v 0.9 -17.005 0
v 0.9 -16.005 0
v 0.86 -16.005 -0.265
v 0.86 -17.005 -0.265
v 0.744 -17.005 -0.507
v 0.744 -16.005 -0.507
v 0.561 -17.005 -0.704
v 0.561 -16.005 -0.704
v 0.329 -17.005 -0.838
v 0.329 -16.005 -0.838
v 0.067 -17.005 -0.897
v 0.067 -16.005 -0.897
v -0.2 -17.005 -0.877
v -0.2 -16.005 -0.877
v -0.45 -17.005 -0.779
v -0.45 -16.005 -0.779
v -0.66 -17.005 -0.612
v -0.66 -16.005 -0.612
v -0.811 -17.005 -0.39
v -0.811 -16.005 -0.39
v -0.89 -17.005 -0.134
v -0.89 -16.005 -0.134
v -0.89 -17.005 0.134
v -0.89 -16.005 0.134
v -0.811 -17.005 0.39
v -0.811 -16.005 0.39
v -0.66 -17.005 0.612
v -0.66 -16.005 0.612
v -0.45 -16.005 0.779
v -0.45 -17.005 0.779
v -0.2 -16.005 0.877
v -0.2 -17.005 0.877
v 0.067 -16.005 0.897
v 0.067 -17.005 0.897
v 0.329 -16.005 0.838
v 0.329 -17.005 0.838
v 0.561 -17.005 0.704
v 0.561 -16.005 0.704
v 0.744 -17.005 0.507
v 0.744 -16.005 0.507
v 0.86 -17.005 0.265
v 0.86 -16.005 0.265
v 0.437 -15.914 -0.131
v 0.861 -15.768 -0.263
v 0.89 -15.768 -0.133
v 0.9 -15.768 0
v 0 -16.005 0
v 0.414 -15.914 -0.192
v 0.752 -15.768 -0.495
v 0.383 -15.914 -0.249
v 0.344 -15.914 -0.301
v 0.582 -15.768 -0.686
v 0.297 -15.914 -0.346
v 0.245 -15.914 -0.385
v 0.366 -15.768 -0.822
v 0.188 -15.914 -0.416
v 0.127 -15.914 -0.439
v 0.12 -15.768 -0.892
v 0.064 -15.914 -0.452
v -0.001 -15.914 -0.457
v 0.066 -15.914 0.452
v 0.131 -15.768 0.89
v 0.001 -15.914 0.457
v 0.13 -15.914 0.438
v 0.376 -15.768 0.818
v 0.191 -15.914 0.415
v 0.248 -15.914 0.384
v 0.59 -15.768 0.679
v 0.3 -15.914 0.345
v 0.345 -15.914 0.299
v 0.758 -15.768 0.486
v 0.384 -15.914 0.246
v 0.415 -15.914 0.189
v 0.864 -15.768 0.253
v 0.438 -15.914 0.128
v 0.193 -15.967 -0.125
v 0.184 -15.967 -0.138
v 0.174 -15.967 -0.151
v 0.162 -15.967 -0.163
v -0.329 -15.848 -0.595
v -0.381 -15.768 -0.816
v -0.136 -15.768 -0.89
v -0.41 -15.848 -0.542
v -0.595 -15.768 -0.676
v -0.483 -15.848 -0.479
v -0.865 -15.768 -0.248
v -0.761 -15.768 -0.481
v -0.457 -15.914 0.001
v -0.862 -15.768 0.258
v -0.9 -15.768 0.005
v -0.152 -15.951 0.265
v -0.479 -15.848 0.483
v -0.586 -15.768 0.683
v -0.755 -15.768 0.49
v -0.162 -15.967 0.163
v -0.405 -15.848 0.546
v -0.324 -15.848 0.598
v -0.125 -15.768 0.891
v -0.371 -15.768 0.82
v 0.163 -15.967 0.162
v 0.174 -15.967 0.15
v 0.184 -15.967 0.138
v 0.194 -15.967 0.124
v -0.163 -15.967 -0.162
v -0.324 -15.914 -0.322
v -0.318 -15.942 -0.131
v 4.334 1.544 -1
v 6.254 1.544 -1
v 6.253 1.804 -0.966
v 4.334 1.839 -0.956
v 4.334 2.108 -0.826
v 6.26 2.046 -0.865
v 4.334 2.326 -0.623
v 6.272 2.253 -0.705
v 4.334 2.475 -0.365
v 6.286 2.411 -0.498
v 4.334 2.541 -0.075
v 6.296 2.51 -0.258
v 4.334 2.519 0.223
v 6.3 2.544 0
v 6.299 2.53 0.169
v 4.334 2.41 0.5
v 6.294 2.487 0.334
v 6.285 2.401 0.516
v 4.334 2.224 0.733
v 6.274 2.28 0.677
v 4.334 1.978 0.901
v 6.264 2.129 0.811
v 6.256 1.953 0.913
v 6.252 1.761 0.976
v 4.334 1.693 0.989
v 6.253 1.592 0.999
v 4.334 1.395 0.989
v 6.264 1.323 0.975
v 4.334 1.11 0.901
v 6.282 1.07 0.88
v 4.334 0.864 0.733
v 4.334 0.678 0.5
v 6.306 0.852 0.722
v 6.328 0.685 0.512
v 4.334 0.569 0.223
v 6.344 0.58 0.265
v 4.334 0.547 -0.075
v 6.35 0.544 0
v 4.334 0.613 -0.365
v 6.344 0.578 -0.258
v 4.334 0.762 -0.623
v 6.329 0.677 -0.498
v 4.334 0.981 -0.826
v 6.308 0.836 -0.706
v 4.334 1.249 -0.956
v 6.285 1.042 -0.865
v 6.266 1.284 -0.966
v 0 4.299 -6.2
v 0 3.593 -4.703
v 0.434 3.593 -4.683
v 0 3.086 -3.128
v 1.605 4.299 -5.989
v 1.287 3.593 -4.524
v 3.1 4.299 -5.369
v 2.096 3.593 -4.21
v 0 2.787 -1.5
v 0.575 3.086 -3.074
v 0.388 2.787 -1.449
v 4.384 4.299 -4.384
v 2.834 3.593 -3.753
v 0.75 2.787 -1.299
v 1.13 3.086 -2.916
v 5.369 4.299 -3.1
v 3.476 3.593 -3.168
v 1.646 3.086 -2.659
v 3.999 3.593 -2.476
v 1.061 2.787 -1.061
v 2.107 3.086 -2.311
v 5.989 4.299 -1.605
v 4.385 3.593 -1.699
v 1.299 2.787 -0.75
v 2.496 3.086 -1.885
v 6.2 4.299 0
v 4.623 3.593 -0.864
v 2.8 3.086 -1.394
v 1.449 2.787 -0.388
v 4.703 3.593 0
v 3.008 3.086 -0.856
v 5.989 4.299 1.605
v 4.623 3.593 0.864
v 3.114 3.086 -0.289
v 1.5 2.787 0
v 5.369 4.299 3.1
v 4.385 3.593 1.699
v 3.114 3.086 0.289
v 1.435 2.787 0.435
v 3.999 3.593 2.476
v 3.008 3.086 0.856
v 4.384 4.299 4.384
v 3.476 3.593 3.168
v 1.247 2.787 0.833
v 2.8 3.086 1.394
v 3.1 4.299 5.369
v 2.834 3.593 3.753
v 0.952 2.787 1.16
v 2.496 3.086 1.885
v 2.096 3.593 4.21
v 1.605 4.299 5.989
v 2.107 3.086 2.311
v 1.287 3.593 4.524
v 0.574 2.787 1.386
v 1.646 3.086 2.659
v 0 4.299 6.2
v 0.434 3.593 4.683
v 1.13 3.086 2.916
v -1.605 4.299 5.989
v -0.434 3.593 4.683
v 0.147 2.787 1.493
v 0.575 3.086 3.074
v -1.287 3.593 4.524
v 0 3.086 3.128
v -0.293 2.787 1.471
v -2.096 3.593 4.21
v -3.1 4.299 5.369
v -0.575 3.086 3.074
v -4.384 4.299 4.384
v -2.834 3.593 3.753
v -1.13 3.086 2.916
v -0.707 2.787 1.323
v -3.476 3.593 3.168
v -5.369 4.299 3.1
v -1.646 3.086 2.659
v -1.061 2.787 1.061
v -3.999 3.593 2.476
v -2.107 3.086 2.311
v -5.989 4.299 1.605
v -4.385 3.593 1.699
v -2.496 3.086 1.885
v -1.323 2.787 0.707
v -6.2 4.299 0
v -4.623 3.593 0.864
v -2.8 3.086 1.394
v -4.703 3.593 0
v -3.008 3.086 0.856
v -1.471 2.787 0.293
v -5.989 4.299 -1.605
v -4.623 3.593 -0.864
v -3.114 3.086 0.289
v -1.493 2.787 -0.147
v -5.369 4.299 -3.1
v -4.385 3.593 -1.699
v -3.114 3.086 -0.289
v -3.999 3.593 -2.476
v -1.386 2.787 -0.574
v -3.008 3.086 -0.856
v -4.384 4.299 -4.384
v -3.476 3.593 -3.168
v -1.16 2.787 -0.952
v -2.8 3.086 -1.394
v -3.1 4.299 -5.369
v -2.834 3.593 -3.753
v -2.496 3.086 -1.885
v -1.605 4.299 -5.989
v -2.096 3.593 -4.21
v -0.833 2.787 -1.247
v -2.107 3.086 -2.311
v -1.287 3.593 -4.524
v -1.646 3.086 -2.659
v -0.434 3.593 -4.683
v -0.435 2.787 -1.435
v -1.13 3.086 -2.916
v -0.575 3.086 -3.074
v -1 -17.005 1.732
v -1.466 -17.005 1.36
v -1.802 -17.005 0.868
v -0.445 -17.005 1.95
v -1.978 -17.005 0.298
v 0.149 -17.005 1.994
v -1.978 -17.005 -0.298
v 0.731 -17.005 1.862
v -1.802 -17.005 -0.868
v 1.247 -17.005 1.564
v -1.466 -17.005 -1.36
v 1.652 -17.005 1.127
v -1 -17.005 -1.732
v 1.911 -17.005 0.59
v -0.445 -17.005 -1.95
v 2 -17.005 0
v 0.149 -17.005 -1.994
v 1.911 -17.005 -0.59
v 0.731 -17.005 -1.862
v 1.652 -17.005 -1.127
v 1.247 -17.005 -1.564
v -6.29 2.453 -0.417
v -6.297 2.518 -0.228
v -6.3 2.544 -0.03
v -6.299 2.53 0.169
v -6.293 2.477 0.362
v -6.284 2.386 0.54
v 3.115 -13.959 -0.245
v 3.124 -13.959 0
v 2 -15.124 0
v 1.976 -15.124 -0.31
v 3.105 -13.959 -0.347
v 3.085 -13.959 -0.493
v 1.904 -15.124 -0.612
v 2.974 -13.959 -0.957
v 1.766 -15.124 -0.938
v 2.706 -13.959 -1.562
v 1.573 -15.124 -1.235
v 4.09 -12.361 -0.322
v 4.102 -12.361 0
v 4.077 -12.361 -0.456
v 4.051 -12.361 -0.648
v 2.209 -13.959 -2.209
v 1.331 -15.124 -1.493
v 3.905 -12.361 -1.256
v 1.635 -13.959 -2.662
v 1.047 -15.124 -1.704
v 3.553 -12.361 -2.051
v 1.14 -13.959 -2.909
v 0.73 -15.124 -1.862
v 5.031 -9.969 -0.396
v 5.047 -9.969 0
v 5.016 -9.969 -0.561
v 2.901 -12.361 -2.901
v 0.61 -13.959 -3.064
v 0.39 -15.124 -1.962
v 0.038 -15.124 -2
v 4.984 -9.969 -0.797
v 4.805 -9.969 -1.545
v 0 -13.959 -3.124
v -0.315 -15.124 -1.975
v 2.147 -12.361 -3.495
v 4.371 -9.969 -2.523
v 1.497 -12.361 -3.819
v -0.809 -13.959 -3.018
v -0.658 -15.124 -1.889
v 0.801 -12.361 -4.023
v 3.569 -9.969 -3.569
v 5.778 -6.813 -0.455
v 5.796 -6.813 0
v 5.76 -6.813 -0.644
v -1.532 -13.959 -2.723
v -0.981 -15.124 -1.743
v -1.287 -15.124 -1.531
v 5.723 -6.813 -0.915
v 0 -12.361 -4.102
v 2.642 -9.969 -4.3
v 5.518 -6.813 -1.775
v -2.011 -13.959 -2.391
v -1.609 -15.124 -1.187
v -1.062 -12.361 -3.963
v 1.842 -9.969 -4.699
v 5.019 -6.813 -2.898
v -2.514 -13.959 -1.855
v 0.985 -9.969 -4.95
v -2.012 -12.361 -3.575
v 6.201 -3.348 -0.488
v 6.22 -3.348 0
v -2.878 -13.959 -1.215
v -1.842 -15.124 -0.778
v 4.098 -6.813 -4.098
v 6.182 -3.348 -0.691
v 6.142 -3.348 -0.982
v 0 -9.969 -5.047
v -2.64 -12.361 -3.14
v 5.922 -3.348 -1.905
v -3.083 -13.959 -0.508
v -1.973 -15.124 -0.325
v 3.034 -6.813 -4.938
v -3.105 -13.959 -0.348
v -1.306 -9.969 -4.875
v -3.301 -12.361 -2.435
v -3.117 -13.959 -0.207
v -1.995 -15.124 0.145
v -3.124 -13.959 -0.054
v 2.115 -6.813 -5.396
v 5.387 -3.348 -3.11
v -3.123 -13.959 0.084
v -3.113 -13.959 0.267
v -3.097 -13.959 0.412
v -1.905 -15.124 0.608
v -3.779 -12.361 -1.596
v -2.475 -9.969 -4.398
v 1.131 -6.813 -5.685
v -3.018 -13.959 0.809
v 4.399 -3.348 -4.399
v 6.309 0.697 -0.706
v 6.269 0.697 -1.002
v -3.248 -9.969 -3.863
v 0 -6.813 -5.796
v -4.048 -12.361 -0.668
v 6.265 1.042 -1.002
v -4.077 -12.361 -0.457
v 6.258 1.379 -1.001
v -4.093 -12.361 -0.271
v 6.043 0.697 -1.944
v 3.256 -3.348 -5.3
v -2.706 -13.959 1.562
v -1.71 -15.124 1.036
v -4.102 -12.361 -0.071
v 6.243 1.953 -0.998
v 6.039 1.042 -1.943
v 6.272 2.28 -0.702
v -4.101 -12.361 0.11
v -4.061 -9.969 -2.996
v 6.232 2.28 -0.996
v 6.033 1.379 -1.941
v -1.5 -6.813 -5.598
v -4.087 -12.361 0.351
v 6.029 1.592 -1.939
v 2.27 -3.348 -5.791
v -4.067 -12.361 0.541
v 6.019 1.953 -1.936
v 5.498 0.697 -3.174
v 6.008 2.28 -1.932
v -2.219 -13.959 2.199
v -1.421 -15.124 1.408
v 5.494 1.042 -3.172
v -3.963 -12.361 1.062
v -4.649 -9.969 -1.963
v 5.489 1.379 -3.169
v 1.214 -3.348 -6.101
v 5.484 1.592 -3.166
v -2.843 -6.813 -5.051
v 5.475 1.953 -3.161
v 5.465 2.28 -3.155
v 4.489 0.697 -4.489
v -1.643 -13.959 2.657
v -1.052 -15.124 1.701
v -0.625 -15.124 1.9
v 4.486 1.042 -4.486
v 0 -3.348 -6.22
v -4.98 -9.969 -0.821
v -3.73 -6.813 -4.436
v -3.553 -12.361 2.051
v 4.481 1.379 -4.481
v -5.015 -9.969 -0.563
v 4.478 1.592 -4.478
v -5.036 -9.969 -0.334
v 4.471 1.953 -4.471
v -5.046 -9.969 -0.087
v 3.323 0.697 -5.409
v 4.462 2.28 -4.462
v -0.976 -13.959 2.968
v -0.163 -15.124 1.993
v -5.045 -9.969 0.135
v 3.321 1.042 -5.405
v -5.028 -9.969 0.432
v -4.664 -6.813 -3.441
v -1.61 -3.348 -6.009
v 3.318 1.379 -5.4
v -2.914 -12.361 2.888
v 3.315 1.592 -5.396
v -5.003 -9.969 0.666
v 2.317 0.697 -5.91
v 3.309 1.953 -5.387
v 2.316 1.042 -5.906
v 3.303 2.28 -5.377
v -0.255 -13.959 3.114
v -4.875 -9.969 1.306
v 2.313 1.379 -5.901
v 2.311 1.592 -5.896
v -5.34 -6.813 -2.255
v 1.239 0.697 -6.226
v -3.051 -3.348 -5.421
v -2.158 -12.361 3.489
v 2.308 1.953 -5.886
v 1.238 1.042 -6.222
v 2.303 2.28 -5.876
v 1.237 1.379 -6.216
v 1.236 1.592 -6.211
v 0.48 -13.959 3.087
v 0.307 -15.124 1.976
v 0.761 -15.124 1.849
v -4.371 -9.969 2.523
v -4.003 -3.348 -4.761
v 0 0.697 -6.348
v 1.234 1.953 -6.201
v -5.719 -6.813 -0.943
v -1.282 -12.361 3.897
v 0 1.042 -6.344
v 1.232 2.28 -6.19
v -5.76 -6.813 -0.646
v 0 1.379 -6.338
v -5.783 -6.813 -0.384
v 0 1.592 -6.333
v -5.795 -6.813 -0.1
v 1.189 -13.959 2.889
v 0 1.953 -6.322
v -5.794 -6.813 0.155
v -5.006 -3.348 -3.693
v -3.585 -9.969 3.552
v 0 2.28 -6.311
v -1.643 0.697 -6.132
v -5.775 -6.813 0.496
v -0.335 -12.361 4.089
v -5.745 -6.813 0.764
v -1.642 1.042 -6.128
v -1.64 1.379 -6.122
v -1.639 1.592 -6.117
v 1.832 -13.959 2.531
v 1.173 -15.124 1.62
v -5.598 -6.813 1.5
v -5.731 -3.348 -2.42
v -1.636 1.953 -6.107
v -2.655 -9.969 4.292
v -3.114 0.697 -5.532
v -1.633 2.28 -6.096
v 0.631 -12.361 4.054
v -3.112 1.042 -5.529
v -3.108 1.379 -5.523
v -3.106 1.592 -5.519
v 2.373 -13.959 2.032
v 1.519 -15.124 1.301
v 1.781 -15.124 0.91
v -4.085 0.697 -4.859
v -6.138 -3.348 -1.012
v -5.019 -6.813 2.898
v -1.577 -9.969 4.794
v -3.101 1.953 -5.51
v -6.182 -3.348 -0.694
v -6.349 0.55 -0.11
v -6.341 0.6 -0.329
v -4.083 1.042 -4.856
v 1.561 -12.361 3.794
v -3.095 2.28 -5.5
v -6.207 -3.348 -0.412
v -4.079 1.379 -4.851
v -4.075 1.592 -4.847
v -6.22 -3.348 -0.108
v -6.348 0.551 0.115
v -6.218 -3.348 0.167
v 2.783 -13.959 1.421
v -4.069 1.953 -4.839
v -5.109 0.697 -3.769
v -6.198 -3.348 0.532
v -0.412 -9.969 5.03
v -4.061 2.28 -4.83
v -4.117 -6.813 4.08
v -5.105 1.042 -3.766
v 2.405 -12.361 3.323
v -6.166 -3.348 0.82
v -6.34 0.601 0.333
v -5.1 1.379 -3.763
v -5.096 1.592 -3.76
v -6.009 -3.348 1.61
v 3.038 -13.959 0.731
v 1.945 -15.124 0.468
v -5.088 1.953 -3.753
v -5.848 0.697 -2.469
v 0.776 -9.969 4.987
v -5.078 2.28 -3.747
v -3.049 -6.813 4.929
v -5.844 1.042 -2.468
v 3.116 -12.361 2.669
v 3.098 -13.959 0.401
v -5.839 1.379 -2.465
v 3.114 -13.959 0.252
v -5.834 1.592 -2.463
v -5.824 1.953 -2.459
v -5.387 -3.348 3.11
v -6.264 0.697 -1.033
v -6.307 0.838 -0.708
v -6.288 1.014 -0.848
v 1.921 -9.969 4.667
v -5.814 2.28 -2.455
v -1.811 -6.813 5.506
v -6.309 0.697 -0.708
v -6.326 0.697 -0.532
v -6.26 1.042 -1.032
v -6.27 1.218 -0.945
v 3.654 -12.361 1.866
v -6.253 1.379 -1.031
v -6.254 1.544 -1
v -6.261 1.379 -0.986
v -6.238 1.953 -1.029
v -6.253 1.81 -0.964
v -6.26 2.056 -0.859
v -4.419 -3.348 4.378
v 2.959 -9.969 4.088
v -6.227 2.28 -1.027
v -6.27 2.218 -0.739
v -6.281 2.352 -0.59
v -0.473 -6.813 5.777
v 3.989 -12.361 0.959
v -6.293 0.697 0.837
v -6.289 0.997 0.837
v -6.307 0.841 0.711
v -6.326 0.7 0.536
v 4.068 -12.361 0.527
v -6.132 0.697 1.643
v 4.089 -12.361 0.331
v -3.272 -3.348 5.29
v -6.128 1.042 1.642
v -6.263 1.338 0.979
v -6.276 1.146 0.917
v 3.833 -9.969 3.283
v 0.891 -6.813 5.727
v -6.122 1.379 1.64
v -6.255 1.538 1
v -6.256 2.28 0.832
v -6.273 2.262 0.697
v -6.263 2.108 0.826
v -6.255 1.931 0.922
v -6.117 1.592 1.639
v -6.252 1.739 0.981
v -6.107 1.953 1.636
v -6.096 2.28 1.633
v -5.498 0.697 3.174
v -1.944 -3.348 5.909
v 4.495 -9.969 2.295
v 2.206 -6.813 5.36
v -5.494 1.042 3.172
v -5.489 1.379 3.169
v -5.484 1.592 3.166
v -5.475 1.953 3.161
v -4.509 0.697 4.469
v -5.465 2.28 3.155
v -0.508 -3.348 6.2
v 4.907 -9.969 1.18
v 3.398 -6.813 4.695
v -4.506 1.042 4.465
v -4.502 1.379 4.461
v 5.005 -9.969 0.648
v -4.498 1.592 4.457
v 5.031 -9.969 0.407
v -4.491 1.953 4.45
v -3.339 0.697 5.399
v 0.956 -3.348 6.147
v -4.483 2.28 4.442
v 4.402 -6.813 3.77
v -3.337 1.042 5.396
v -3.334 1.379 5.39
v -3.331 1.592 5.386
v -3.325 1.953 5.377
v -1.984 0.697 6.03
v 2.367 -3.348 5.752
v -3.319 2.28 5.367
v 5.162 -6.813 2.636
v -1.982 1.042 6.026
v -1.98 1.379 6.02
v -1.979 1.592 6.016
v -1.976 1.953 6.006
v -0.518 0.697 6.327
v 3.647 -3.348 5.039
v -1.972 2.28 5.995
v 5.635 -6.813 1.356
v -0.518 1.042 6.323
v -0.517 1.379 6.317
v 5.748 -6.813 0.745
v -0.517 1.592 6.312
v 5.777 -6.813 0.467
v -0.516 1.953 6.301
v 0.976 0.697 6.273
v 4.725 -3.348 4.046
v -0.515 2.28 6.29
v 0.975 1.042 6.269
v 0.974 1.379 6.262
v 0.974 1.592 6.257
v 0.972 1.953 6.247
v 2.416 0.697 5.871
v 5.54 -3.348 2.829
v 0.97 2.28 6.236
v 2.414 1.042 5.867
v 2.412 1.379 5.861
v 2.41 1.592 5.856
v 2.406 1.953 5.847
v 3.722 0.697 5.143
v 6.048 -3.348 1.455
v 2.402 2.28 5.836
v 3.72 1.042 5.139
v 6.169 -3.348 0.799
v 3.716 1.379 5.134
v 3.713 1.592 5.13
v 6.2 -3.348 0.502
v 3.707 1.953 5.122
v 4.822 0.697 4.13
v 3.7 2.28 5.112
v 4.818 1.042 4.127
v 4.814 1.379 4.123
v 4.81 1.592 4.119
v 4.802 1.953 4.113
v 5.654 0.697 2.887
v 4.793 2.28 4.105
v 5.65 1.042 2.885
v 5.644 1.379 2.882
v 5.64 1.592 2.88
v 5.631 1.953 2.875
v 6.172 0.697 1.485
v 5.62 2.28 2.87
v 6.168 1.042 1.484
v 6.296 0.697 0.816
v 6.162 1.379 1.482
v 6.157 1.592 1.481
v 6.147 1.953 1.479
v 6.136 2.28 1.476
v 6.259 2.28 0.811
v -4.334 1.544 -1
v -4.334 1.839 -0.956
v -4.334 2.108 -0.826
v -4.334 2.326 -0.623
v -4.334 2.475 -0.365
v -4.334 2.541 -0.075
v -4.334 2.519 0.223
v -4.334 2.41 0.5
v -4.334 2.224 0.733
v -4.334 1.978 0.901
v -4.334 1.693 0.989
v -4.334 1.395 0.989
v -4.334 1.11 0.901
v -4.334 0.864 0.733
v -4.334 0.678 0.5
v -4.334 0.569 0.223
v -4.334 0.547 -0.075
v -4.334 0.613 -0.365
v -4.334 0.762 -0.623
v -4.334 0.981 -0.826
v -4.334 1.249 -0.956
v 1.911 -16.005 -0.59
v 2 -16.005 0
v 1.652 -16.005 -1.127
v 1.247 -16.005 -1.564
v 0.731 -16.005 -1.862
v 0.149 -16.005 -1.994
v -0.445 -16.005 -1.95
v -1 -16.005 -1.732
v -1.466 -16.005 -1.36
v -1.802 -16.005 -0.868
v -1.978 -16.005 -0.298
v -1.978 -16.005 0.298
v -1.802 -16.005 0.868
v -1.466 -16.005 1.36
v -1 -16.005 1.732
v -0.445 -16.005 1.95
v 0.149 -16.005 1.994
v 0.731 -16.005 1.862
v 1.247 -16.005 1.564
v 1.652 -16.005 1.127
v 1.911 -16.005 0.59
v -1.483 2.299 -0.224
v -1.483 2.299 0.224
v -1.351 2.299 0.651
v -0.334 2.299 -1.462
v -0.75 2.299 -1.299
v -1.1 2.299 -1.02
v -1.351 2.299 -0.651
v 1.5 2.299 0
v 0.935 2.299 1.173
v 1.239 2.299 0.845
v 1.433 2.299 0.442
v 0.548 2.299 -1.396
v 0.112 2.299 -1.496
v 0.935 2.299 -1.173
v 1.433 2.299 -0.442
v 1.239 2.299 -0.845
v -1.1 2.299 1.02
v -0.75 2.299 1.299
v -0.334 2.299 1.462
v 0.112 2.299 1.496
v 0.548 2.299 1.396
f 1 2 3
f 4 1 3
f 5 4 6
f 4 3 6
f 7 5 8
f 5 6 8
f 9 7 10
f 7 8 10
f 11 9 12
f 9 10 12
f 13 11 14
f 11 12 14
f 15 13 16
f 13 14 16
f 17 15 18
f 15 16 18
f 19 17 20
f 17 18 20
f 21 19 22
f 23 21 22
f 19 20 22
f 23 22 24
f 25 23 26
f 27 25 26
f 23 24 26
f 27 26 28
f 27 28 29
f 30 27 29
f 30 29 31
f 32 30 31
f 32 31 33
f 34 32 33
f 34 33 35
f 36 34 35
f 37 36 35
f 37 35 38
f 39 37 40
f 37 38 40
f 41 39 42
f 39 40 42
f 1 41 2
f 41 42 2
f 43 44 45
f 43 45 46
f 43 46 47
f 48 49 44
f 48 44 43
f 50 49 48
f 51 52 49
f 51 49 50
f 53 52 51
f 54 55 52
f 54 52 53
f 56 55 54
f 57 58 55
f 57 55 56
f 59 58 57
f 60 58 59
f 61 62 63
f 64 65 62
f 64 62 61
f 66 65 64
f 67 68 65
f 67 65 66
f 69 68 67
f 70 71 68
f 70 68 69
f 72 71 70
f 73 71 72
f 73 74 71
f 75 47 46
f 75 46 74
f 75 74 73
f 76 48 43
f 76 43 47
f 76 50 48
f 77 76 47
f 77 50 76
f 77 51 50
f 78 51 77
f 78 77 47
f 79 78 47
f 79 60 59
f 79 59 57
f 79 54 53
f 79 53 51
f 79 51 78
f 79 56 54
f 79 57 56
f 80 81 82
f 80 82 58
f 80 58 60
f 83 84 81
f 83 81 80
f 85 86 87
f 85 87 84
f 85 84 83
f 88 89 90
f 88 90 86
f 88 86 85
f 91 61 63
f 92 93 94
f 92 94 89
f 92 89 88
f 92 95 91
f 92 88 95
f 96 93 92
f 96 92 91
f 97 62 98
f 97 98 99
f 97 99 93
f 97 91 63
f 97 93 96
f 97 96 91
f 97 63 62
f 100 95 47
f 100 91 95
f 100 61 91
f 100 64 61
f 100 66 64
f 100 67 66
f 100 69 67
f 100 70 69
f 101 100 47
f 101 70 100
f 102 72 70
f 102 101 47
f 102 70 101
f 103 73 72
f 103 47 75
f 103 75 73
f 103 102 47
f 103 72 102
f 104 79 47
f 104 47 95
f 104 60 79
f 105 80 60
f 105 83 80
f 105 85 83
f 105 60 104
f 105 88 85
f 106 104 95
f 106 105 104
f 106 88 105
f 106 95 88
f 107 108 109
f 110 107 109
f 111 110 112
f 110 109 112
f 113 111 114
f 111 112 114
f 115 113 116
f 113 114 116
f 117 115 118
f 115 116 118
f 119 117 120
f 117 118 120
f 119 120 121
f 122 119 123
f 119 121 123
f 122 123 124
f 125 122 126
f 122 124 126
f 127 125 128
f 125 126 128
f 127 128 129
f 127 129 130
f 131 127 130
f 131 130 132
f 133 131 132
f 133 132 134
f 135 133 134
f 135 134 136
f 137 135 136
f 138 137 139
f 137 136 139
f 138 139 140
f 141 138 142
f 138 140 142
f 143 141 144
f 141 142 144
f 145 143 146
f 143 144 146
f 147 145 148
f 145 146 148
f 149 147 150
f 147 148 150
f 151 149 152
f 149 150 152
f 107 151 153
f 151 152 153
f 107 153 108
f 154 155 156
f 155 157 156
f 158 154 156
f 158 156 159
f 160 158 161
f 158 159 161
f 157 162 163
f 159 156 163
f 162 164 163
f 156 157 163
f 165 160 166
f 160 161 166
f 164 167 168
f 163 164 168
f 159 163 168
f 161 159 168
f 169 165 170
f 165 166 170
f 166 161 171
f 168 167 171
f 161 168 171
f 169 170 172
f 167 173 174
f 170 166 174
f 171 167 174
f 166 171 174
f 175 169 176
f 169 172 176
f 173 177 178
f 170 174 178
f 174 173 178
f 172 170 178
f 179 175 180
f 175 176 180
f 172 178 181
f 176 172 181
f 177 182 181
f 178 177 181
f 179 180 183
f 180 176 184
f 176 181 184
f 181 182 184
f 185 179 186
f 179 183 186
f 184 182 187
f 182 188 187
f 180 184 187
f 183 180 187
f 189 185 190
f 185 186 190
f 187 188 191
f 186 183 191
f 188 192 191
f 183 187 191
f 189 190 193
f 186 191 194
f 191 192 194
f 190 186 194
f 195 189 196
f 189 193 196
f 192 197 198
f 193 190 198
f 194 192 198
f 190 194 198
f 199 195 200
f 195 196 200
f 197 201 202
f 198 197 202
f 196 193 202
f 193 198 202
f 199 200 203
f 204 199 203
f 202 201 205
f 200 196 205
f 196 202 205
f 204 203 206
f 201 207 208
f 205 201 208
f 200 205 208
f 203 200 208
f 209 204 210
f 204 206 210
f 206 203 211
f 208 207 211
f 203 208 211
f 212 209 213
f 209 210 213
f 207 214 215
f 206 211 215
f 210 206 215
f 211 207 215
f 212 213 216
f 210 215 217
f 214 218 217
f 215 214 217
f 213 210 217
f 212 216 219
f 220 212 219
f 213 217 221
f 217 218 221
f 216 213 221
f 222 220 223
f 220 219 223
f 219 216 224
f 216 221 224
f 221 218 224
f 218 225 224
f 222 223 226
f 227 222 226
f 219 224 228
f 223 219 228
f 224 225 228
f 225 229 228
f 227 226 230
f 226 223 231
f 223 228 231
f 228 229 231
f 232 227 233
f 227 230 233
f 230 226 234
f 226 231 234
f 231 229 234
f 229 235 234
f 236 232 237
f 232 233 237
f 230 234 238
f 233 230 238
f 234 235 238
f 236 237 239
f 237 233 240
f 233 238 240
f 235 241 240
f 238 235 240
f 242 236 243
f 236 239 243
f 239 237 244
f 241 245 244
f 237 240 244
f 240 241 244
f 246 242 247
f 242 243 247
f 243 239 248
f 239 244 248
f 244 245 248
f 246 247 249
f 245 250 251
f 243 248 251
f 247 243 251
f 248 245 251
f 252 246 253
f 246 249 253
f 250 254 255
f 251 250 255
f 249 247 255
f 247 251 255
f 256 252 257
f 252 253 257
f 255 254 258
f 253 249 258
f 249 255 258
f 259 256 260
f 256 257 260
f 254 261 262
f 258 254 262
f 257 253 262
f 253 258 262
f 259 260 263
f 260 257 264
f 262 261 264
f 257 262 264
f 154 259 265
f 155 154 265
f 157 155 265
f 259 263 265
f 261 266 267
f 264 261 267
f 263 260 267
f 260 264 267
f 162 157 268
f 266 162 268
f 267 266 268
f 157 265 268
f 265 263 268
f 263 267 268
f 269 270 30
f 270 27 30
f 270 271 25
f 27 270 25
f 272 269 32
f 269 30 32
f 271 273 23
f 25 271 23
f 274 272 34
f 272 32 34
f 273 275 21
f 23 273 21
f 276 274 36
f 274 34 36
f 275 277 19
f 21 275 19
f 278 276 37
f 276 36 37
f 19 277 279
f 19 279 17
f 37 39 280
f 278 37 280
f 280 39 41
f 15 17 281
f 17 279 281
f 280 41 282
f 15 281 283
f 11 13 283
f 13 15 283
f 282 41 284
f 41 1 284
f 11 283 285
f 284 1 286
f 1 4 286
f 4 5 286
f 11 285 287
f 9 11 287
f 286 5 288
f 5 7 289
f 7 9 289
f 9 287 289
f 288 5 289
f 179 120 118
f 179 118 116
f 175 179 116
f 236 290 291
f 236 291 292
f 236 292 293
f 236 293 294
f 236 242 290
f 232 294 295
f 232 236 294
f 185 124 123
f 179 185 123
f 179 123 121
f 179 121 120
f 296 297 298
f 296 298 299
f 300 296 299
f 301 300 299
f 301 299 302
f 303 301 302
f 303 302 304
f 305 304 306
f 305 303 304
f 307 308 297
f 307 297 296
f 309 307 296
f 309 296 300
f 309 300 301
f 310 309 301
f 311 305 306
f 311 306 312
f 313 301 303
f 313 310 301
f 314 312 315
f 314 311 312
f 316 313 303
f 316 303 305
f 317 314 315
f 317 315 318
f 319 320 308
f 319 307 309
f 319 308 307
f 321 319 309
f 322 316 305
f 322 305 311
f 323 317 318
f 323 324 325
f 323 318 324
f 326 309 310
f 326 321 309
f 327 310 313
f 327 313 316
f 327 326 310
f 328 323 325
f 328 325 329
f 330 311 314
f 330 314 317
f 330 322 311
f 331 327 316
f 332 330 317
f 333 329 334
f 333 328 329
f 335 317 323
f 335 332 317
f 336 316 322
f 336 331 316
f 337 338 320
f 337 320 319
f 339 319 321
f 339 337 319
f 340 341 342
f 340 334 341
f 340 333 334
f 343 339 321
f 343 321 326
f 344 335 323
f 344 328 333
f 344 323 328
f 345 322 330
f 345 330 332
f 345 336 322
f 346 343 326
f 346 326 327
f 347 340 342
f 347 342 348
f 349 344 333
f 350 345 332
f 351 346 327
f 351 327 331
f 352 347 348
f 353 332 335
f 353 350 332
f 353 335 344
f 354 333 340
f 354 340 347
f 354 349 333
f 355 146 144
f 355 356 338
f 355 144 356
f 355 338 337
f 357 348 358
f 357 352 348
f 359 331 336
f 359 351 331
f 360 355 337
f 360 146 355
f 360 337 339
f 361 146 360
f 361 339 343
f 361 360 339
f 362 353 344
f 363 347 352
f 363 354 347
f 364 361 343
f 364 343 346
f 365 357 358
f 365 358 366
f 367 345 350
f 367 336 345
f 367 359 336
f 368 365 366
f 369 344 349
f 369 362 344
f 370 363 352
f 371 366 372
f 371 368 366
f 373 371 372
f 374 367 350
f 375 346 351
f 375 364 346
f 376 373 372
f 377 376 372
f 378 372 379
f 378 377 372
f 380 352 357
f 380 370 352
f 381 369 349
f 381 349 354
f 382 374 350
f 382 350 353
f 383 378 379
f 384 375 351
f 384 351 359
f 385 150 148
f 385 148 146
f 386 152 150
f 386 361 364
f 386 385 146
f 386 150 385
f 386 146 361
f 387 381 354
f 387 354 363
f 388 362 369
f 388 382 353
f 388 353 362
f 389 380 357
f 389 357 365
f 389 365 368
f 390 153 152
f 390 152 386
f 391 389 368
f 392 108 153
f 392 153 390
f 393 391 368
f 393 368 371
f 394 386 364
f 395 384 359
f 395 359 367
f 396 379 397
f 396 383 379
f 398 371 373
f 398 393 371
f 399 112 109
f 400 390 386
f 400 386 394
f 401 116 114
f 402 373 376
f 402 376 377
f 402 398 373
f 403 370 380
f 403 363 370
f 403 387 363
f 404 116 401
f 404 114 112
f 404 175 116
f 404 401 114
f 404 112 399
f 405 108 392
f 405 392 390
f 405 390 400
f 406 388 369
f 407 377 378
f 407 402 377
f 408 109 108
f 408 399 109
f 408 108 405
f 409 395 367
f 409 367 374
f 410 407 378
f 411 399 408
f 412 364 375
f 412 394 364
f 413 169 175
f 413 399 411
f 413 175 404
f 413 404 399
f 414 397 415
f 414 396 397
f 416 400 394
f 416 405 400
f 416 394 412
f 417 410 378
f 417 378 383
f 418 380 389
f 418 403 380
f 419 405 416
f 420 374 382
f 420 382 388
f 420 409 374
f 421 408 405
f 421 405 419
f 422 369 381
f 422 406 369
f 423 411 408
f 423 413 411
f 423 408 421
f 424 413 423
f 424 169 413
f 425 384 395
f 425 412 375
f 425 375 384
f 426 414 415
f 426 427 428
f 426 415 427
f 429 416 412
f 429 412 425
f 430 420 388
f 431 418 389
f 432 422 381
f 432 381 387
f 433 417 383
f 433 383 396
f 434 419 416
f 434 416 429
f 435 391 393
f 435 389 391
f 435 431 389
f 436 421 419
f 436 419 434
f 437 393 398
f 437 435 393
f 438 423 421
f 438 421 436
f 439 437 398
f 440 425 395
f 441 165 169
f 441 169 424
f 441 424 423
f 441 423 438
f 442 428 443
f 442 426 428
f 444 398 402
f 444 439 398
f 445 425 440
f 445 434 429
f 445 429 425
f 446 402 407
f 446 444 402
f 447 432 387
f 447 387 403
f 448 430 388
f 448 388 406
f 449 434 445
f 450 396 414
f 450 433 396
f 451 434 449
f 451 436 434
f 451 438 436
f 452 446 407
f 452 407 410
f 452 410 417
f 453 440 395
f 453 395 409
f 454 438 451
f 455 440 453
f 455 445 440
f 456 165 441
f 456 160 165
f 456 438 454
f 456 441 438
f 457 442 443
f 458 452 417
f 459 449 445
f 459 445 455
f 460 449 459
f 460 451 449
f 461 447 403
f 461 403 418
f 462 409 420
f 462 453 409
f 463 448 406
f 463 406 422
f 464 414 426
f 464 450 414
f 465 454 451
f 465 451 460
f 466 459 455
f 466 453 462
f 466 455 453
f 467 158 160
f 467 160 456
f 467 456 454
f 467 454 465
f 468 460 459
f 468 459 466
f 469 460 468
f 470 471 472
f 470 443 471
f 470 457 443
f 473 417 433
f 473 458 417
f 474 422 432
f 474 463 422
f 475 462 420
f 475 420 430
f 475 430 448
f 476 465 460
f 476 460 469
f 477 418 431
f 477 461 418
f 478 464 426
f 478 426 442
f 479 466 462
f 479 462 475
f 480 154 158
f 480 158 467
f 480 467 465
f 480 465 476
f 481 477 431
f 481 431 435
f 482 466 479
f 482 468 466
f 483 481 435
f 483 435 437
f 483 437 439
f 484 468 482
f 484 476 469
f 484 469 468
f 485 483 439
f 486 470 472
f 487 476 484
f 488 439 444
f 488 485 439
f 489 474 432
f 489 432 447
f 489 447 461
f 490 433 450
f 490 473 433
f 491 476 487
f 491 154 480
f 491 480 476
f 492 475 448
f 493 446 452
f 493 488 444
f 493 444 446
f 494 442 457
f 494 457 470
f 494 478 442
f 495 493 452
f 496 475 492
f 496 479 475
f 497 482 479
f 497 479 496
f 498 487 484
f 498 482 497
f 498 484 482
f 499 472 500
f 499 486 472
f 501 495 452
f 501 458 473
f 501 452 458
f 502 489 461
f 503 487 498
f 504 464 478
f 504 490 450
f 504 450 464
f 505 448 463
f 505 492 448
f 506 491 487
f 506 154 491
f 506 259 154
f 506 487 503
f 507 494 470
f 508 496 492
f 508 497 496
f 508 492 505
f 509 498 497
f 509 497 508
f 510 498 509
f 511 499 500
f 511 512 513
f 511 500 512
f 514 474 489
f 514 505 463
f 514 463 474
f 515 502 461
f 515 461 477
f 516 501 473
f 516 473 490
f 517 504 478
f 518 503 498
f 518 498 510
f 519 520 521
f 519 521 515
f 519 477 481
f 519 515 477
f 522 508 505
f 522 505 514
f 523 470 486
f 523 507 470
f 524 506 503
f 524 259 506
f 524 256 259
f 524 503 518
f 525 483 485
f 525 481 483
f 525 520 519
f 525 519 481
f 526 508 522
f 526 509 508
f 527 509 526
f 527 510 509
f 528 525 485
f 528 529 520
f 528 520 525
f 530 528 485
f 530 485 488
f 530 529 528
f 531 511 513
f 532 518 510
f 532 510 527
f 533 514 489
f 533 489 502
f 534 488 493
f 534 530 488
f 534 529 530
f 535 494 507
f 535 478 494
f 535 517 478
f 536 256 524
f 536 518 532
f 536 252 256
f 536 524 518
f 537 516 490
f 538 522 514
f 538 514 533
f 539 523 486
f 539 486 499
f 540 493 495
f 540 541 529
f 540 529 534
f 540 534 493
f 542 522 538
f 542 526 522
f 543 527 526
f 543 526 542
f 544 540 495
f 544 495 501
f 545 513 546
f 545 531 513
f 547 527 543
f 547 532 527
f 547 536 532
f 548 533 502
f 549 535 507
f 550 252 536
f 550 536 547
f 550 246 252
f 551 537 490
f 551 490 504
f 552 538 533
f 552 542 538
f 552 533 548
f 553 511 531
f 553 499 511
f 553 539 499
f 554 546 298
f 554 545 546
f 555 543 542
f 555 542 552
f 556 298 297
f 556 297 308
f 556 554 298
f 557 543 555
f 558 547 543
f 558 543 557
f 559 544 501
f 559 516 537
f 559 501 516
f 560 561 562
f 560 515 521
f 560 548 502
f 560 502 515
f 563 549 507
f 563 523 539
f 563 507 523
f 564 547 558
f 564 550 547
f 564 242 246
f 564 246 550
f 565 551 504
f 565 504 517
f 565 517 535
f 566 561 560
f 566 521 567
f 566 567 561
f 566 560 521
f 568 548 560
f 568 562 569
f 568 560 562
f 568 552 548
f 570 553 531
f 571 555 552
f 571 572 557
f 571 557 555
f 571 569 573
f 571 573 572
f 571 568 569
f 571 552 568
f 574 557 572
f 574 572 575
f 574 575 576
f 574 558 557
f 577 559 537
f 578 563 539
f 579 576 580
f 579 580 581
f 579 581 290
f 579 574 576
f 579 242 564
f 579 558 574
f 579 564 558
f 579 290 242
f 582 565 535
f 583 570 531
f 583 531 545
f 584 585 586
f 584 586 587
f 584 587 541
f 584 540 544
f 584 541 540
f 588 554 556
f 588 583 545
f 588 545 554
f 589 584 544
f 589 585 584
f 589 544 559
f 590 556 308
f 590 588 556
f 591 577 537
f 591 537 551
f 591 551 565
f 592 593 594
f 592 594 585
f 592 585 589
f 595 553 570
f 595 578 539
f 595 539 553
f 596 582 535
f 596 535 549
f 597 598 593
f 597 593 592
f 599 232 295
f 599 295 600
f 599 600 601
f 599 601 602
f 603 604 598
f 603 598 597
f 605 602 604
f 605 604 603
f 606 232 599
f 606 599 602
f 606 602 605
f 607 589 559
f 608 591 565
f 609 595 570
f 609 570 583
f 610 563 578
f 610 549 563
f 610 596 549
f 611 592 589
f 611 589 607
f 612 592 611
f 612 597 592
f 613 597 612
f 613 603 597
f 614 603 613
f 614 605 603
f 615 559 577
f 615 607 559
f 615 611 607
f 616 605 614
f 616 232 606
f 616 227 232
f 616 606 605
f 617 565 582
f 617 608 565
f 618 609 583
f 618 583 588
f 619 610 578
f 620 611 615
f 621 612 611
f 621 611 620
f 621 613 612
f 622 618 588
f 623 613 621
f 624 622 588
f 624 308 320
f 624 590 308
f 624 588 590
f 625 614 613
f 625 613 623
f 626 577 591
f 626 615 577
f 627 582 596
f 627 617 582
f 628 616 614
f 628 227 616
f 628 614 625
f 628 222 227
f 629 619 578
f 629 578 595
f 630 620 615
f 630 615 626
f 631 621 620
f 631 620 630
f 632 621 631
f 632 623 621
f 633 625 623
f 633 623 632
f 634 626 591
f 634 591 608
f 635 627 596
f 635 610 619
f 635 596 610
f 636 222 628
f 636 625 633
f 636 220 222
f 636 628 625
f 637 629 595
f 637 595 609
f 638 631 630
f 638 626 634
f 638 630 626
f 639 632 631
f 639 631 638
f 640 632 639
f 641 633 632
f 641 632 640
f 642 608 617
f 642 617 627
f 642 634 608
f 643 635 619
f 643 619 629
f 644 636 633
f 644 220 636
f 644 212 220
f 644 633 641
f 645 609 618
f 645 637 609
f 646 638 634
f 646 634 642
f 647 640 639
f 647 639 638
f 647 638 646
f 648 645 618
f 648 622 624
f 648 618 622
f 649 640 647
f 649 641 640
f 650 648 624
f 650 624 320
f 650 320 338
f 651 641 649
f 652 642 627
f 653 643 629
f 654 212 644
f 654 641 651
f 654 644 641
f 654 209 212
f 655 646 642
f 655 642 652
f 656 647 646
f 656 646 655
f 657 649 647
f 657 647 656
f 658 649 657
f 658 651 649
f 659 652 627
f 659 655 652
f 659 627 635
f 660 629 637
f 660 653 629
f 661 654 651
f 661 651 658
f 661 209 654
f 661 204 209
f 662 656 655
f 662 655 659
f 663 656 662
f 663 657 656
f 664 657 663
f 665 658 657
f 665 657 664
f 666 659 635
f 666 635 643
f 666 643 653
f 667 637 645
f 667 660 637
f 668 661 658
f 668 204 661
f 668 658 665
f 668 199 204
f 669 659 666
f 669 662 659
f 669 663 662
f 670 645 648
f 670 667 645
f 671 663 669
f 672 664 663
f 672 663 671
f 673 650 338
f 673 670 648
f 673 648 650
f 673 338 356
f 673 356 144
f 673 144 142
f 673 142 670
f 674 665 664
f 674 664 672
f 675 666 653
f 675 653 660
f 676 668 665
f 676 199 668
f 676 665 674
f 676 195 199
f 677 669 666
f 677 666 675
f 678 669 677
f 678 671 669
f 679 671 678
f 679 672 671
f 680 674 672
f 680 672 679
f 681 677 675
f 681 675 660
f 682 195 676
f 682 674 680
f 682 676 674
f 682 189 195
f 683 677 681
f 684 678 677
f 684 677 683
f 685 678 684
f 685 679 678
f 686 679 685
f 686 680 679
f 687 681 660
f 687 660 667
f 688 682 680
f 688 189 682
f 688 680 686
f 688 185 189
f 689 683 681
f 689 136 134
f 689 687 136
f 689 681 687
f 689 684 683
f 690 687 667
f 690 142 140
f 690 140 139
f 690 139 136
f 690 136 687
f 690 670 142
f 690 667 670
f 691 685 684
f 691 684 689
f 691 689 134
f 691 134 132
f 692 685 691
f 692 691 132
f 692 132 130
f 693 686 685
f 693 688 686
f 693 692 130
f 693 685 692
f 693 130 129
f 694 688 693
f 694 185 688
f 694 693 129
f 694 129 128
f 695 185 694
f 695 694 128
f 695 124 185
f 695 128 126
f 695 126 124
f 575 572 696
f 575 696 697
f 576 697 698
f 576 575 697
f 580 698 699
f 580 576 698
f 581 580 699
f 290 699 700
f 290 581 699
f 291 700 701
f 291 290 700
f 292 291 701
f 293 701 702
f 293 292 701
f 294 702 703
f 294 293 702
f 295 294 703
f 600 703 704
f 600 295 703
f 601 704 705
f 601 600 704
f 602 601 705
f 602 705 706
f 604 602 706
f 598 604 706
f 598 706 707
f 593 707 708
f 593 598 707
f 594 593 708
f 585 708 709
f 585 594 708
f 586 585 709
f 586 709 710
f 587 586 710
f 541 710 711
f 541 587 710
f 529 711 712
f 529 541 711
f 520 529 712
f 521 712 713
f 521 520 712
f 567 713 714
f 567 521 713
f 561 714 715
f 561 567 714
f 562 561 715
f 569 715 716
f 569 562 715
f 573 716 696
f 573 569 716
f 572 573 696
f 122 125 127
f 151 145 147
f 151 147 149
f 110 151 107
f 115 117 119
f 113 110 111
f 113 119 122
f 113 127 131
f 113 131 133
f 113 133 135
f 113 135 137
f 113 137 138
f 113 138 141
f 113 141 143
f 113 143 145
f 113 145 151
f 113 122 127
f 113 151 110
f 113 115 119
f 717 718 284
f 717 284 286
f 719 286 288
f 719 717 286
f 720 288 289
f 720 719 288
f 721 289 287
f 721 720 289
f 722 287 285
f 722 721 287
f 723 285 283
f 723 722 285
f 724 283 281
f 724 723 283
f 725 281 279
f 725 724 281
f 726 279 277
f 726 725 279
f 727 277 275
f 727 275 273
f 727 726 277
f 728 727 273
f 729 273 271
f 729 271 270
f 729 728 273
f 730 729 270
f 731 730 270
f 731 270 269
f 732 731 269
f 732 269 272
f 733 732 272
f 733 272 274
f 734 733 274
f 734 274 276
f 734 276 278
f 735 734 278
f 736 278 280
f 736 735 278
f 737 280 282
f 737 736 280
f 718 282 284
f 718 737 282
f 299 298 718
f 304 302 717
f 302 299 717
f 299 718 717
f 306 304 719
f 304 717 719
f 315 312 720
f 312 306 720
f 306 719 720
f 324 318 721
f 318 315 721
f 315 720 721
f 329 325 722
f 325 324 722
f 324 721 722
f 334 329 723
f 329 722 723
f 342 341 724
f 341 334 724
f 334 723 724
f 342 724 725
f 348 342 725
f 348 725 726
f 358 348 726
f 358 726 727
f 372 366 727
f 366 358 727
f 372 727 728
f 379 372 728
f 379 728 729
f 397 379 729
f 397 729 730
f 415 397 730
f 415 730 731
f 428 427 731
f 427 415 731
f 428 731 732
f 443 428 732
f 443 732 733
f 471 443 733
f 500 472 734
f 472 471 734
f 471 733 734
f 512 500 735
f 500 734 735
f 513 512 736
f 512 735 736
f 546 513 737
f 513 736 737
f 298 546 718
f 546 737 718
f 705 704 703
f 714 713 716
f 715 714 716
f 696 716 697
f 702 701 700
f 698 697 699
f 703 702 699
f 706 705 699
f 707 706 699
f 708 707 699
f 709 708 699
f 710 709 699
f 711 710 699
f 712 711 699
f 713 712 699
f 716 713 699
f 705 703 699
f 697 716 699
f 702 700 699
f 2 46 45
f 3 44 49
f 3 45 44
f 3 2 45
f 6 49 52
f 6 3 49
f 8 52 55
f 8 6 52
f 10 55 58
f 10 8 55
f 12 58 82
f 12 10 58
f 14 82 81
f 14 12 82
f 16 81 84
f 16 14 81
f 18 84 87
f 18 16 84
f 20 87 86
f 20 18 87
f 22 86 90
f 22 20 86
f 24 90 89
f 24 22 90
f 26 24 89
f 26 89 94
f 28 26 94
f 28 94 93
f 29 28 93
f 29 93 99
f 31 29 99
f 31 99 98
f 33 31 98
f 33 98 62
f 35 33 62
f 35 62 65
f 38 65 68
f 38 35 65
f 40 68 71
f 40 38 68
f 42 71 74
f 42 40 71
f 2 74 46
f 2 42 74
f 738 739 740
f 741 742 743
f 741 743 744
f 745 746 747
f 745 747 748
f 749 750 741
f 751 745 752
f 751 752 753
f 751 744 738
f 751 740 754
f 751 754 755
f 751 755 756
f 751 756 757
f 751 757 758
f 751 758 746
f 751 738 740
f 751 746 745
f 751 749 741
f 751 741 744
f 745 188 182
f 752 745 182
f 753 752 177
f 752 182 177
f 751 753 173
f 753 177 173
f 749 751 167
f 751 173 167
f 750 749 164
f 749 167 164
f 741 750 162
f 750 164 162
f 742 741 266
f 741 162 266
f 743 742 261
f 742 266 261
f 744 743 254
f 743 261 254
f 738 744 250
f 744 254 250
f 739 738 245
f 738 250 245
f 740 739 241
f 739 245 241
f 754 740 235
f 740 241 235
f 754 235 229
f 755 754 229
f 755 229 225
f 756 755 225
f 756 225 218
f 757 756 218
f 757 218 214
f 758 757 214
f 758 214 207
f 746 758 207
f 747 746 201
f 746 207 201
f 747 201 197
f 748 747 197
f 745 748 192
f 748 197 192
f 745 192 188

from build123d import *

# Parameters (mm, degrees)
DOME2_FACE_RADIUS               = 3.1
DOME2_HEIGHT                    = 0.8
SKETCH6_R                       = 0.500000006
CUT_EXTRUDE2_DEPTH              = 1
SKETCH7_R                       = 0.75
CUT_EXTRUDE3_DEPTH              = 1
BOSS_EXTRUDE1_REACH             = 12.152
SKETCH9_R                       = 1
SKETCH9_R_2                     = 0.45
BOSS_EXTRUDE1_DIRECTION_2_DEPTH = 0.5
SCALE1_SCALE                    = 2


with BuildPart() as part:
    # Sketch2 → Revolve2 (revolve)
    with BuildSketch(Plane.XY):
        with BuildLine():
            Line((0, 0), (3.1, 0))
            add(Edge.make_bspline(
                [(0, -10.151978408), (2.177642547, -9.857333884), (3.515065362, -5.793498011), (3.1, 0)],
                knots=[0, 0, 0, 0, 1, 1, 1, 1], degree=3))
            Line((0, -10.151978408), (0, 0))
        make_face()
    revolve(axis=Axis((0, -10.151978408, 0), (0, 1, 0)))

    # Dome2: a dome of height H over a round flat face of radius A is a cap of a sphere of radius (A * A + H * H) / (2 * H)
    dome2_r = (DOME2_FACE_RADIUS * DOME2_FACE_RADIUS + DOME2_HEIGHT * DOME2_HEIGHT) / (2 * DOME2_HEIGHT)
    dome2_base = Plane((0, 0, 0), z_dir=(0, -1, 0))
    with Locations(dome2_base.offset(DOME2_HEIGHT - dome2_r)):
        dome2_ball = Sphere(dome2_r, mode=Mode.PRIVATE)
    add(split(dome2_ball, bisect_by=dome2_base, keep=Keep.TOP, mode=Mode.PRIVATE), mode=Mode.SUBTRACT)

    # Sketch6 → Cut-Extrude2 (cut, symmetric)
    with BuildSketch(Plane(origin=(3.16696636, 0, 0), x_dir=(0, 0, -1), z_dir=(1, 0, 0))):
        with Locations((0, -1.377313707)):
            Circle(SKETCH6_R)
    cut_extrude2 = extrude(amount=CUT_EXTRUDE2_DEPTH, both=True, mode=Mode.SUBTRACT)

    # Mirror1: Cut-Extrude2 across plane
    add(cut_extrude2.mirror(Plane(origin=(0, 0, 0), x_dir=(0, 0, 1), z_dir=(1, 0, 0))), mode=Mode.SUBTRACT)

    # Sketch7 → Cut-Extrude3 (cut)
    with BuildSketch(Plane(origin=(0, 0, 0), x_dir=(1, 0, 0), z_dir=(0, 1, 0))):
        Circle(SKETCH7_R)
    extrude(amount=-CUT_EXTRUDE3_DEPTH, mode=Mode.SUBTRACT)

    # Sketch9 → Boss-Extrude1 (add, up to next)
    with BuildSketch(Plane(origin=(0, -10.151978408, 0), x_dir=(1, 0, 0), z_dir=(0, 1, 0)), mode=Mode.PRIVATE) as boss_extrude1_sk1:
        Circle(SKETCH9_R)
        Circle(SKETCH9_R_2, mode=Mode.SUBTRACT)
    boss_extrude1_tool1 = extrude(boss_extrude1_sk1.sketch, amount=BOSS_EXTRUDE1_REACH, mode=Mode.PRIVATE) - part.part
    add(boss_extrude1_tool1.solids().sort_by_distance((-0.971716, -10.151978, 0))[0])

    # Sketch9 → Boss-Extrude1 direction 2 (add)
    with BuildSketch(Plane(origin=(0, -10.151978408, 0), x_dir=(1, 0, 0), z_dir=(0, 1, 0))):
        Circle(SKETCH9_R)
        Circle(SKETCH9_R_2, mode=Mode.SUBTRACT)
    extrude(amount=-BOSS_EXTRUDE1_DIRECTION_2_DEPTH)


with BuildPart() as part_1:
    # Scale1: scaled about (3.7e-08, -4.298834834, 9.2e-08)
    add(part.part.scale(SCALE1_SCALE).moved(Location((-3.7e-08, 4.298834834, -9.2e-08))))


solid = part_1.part
